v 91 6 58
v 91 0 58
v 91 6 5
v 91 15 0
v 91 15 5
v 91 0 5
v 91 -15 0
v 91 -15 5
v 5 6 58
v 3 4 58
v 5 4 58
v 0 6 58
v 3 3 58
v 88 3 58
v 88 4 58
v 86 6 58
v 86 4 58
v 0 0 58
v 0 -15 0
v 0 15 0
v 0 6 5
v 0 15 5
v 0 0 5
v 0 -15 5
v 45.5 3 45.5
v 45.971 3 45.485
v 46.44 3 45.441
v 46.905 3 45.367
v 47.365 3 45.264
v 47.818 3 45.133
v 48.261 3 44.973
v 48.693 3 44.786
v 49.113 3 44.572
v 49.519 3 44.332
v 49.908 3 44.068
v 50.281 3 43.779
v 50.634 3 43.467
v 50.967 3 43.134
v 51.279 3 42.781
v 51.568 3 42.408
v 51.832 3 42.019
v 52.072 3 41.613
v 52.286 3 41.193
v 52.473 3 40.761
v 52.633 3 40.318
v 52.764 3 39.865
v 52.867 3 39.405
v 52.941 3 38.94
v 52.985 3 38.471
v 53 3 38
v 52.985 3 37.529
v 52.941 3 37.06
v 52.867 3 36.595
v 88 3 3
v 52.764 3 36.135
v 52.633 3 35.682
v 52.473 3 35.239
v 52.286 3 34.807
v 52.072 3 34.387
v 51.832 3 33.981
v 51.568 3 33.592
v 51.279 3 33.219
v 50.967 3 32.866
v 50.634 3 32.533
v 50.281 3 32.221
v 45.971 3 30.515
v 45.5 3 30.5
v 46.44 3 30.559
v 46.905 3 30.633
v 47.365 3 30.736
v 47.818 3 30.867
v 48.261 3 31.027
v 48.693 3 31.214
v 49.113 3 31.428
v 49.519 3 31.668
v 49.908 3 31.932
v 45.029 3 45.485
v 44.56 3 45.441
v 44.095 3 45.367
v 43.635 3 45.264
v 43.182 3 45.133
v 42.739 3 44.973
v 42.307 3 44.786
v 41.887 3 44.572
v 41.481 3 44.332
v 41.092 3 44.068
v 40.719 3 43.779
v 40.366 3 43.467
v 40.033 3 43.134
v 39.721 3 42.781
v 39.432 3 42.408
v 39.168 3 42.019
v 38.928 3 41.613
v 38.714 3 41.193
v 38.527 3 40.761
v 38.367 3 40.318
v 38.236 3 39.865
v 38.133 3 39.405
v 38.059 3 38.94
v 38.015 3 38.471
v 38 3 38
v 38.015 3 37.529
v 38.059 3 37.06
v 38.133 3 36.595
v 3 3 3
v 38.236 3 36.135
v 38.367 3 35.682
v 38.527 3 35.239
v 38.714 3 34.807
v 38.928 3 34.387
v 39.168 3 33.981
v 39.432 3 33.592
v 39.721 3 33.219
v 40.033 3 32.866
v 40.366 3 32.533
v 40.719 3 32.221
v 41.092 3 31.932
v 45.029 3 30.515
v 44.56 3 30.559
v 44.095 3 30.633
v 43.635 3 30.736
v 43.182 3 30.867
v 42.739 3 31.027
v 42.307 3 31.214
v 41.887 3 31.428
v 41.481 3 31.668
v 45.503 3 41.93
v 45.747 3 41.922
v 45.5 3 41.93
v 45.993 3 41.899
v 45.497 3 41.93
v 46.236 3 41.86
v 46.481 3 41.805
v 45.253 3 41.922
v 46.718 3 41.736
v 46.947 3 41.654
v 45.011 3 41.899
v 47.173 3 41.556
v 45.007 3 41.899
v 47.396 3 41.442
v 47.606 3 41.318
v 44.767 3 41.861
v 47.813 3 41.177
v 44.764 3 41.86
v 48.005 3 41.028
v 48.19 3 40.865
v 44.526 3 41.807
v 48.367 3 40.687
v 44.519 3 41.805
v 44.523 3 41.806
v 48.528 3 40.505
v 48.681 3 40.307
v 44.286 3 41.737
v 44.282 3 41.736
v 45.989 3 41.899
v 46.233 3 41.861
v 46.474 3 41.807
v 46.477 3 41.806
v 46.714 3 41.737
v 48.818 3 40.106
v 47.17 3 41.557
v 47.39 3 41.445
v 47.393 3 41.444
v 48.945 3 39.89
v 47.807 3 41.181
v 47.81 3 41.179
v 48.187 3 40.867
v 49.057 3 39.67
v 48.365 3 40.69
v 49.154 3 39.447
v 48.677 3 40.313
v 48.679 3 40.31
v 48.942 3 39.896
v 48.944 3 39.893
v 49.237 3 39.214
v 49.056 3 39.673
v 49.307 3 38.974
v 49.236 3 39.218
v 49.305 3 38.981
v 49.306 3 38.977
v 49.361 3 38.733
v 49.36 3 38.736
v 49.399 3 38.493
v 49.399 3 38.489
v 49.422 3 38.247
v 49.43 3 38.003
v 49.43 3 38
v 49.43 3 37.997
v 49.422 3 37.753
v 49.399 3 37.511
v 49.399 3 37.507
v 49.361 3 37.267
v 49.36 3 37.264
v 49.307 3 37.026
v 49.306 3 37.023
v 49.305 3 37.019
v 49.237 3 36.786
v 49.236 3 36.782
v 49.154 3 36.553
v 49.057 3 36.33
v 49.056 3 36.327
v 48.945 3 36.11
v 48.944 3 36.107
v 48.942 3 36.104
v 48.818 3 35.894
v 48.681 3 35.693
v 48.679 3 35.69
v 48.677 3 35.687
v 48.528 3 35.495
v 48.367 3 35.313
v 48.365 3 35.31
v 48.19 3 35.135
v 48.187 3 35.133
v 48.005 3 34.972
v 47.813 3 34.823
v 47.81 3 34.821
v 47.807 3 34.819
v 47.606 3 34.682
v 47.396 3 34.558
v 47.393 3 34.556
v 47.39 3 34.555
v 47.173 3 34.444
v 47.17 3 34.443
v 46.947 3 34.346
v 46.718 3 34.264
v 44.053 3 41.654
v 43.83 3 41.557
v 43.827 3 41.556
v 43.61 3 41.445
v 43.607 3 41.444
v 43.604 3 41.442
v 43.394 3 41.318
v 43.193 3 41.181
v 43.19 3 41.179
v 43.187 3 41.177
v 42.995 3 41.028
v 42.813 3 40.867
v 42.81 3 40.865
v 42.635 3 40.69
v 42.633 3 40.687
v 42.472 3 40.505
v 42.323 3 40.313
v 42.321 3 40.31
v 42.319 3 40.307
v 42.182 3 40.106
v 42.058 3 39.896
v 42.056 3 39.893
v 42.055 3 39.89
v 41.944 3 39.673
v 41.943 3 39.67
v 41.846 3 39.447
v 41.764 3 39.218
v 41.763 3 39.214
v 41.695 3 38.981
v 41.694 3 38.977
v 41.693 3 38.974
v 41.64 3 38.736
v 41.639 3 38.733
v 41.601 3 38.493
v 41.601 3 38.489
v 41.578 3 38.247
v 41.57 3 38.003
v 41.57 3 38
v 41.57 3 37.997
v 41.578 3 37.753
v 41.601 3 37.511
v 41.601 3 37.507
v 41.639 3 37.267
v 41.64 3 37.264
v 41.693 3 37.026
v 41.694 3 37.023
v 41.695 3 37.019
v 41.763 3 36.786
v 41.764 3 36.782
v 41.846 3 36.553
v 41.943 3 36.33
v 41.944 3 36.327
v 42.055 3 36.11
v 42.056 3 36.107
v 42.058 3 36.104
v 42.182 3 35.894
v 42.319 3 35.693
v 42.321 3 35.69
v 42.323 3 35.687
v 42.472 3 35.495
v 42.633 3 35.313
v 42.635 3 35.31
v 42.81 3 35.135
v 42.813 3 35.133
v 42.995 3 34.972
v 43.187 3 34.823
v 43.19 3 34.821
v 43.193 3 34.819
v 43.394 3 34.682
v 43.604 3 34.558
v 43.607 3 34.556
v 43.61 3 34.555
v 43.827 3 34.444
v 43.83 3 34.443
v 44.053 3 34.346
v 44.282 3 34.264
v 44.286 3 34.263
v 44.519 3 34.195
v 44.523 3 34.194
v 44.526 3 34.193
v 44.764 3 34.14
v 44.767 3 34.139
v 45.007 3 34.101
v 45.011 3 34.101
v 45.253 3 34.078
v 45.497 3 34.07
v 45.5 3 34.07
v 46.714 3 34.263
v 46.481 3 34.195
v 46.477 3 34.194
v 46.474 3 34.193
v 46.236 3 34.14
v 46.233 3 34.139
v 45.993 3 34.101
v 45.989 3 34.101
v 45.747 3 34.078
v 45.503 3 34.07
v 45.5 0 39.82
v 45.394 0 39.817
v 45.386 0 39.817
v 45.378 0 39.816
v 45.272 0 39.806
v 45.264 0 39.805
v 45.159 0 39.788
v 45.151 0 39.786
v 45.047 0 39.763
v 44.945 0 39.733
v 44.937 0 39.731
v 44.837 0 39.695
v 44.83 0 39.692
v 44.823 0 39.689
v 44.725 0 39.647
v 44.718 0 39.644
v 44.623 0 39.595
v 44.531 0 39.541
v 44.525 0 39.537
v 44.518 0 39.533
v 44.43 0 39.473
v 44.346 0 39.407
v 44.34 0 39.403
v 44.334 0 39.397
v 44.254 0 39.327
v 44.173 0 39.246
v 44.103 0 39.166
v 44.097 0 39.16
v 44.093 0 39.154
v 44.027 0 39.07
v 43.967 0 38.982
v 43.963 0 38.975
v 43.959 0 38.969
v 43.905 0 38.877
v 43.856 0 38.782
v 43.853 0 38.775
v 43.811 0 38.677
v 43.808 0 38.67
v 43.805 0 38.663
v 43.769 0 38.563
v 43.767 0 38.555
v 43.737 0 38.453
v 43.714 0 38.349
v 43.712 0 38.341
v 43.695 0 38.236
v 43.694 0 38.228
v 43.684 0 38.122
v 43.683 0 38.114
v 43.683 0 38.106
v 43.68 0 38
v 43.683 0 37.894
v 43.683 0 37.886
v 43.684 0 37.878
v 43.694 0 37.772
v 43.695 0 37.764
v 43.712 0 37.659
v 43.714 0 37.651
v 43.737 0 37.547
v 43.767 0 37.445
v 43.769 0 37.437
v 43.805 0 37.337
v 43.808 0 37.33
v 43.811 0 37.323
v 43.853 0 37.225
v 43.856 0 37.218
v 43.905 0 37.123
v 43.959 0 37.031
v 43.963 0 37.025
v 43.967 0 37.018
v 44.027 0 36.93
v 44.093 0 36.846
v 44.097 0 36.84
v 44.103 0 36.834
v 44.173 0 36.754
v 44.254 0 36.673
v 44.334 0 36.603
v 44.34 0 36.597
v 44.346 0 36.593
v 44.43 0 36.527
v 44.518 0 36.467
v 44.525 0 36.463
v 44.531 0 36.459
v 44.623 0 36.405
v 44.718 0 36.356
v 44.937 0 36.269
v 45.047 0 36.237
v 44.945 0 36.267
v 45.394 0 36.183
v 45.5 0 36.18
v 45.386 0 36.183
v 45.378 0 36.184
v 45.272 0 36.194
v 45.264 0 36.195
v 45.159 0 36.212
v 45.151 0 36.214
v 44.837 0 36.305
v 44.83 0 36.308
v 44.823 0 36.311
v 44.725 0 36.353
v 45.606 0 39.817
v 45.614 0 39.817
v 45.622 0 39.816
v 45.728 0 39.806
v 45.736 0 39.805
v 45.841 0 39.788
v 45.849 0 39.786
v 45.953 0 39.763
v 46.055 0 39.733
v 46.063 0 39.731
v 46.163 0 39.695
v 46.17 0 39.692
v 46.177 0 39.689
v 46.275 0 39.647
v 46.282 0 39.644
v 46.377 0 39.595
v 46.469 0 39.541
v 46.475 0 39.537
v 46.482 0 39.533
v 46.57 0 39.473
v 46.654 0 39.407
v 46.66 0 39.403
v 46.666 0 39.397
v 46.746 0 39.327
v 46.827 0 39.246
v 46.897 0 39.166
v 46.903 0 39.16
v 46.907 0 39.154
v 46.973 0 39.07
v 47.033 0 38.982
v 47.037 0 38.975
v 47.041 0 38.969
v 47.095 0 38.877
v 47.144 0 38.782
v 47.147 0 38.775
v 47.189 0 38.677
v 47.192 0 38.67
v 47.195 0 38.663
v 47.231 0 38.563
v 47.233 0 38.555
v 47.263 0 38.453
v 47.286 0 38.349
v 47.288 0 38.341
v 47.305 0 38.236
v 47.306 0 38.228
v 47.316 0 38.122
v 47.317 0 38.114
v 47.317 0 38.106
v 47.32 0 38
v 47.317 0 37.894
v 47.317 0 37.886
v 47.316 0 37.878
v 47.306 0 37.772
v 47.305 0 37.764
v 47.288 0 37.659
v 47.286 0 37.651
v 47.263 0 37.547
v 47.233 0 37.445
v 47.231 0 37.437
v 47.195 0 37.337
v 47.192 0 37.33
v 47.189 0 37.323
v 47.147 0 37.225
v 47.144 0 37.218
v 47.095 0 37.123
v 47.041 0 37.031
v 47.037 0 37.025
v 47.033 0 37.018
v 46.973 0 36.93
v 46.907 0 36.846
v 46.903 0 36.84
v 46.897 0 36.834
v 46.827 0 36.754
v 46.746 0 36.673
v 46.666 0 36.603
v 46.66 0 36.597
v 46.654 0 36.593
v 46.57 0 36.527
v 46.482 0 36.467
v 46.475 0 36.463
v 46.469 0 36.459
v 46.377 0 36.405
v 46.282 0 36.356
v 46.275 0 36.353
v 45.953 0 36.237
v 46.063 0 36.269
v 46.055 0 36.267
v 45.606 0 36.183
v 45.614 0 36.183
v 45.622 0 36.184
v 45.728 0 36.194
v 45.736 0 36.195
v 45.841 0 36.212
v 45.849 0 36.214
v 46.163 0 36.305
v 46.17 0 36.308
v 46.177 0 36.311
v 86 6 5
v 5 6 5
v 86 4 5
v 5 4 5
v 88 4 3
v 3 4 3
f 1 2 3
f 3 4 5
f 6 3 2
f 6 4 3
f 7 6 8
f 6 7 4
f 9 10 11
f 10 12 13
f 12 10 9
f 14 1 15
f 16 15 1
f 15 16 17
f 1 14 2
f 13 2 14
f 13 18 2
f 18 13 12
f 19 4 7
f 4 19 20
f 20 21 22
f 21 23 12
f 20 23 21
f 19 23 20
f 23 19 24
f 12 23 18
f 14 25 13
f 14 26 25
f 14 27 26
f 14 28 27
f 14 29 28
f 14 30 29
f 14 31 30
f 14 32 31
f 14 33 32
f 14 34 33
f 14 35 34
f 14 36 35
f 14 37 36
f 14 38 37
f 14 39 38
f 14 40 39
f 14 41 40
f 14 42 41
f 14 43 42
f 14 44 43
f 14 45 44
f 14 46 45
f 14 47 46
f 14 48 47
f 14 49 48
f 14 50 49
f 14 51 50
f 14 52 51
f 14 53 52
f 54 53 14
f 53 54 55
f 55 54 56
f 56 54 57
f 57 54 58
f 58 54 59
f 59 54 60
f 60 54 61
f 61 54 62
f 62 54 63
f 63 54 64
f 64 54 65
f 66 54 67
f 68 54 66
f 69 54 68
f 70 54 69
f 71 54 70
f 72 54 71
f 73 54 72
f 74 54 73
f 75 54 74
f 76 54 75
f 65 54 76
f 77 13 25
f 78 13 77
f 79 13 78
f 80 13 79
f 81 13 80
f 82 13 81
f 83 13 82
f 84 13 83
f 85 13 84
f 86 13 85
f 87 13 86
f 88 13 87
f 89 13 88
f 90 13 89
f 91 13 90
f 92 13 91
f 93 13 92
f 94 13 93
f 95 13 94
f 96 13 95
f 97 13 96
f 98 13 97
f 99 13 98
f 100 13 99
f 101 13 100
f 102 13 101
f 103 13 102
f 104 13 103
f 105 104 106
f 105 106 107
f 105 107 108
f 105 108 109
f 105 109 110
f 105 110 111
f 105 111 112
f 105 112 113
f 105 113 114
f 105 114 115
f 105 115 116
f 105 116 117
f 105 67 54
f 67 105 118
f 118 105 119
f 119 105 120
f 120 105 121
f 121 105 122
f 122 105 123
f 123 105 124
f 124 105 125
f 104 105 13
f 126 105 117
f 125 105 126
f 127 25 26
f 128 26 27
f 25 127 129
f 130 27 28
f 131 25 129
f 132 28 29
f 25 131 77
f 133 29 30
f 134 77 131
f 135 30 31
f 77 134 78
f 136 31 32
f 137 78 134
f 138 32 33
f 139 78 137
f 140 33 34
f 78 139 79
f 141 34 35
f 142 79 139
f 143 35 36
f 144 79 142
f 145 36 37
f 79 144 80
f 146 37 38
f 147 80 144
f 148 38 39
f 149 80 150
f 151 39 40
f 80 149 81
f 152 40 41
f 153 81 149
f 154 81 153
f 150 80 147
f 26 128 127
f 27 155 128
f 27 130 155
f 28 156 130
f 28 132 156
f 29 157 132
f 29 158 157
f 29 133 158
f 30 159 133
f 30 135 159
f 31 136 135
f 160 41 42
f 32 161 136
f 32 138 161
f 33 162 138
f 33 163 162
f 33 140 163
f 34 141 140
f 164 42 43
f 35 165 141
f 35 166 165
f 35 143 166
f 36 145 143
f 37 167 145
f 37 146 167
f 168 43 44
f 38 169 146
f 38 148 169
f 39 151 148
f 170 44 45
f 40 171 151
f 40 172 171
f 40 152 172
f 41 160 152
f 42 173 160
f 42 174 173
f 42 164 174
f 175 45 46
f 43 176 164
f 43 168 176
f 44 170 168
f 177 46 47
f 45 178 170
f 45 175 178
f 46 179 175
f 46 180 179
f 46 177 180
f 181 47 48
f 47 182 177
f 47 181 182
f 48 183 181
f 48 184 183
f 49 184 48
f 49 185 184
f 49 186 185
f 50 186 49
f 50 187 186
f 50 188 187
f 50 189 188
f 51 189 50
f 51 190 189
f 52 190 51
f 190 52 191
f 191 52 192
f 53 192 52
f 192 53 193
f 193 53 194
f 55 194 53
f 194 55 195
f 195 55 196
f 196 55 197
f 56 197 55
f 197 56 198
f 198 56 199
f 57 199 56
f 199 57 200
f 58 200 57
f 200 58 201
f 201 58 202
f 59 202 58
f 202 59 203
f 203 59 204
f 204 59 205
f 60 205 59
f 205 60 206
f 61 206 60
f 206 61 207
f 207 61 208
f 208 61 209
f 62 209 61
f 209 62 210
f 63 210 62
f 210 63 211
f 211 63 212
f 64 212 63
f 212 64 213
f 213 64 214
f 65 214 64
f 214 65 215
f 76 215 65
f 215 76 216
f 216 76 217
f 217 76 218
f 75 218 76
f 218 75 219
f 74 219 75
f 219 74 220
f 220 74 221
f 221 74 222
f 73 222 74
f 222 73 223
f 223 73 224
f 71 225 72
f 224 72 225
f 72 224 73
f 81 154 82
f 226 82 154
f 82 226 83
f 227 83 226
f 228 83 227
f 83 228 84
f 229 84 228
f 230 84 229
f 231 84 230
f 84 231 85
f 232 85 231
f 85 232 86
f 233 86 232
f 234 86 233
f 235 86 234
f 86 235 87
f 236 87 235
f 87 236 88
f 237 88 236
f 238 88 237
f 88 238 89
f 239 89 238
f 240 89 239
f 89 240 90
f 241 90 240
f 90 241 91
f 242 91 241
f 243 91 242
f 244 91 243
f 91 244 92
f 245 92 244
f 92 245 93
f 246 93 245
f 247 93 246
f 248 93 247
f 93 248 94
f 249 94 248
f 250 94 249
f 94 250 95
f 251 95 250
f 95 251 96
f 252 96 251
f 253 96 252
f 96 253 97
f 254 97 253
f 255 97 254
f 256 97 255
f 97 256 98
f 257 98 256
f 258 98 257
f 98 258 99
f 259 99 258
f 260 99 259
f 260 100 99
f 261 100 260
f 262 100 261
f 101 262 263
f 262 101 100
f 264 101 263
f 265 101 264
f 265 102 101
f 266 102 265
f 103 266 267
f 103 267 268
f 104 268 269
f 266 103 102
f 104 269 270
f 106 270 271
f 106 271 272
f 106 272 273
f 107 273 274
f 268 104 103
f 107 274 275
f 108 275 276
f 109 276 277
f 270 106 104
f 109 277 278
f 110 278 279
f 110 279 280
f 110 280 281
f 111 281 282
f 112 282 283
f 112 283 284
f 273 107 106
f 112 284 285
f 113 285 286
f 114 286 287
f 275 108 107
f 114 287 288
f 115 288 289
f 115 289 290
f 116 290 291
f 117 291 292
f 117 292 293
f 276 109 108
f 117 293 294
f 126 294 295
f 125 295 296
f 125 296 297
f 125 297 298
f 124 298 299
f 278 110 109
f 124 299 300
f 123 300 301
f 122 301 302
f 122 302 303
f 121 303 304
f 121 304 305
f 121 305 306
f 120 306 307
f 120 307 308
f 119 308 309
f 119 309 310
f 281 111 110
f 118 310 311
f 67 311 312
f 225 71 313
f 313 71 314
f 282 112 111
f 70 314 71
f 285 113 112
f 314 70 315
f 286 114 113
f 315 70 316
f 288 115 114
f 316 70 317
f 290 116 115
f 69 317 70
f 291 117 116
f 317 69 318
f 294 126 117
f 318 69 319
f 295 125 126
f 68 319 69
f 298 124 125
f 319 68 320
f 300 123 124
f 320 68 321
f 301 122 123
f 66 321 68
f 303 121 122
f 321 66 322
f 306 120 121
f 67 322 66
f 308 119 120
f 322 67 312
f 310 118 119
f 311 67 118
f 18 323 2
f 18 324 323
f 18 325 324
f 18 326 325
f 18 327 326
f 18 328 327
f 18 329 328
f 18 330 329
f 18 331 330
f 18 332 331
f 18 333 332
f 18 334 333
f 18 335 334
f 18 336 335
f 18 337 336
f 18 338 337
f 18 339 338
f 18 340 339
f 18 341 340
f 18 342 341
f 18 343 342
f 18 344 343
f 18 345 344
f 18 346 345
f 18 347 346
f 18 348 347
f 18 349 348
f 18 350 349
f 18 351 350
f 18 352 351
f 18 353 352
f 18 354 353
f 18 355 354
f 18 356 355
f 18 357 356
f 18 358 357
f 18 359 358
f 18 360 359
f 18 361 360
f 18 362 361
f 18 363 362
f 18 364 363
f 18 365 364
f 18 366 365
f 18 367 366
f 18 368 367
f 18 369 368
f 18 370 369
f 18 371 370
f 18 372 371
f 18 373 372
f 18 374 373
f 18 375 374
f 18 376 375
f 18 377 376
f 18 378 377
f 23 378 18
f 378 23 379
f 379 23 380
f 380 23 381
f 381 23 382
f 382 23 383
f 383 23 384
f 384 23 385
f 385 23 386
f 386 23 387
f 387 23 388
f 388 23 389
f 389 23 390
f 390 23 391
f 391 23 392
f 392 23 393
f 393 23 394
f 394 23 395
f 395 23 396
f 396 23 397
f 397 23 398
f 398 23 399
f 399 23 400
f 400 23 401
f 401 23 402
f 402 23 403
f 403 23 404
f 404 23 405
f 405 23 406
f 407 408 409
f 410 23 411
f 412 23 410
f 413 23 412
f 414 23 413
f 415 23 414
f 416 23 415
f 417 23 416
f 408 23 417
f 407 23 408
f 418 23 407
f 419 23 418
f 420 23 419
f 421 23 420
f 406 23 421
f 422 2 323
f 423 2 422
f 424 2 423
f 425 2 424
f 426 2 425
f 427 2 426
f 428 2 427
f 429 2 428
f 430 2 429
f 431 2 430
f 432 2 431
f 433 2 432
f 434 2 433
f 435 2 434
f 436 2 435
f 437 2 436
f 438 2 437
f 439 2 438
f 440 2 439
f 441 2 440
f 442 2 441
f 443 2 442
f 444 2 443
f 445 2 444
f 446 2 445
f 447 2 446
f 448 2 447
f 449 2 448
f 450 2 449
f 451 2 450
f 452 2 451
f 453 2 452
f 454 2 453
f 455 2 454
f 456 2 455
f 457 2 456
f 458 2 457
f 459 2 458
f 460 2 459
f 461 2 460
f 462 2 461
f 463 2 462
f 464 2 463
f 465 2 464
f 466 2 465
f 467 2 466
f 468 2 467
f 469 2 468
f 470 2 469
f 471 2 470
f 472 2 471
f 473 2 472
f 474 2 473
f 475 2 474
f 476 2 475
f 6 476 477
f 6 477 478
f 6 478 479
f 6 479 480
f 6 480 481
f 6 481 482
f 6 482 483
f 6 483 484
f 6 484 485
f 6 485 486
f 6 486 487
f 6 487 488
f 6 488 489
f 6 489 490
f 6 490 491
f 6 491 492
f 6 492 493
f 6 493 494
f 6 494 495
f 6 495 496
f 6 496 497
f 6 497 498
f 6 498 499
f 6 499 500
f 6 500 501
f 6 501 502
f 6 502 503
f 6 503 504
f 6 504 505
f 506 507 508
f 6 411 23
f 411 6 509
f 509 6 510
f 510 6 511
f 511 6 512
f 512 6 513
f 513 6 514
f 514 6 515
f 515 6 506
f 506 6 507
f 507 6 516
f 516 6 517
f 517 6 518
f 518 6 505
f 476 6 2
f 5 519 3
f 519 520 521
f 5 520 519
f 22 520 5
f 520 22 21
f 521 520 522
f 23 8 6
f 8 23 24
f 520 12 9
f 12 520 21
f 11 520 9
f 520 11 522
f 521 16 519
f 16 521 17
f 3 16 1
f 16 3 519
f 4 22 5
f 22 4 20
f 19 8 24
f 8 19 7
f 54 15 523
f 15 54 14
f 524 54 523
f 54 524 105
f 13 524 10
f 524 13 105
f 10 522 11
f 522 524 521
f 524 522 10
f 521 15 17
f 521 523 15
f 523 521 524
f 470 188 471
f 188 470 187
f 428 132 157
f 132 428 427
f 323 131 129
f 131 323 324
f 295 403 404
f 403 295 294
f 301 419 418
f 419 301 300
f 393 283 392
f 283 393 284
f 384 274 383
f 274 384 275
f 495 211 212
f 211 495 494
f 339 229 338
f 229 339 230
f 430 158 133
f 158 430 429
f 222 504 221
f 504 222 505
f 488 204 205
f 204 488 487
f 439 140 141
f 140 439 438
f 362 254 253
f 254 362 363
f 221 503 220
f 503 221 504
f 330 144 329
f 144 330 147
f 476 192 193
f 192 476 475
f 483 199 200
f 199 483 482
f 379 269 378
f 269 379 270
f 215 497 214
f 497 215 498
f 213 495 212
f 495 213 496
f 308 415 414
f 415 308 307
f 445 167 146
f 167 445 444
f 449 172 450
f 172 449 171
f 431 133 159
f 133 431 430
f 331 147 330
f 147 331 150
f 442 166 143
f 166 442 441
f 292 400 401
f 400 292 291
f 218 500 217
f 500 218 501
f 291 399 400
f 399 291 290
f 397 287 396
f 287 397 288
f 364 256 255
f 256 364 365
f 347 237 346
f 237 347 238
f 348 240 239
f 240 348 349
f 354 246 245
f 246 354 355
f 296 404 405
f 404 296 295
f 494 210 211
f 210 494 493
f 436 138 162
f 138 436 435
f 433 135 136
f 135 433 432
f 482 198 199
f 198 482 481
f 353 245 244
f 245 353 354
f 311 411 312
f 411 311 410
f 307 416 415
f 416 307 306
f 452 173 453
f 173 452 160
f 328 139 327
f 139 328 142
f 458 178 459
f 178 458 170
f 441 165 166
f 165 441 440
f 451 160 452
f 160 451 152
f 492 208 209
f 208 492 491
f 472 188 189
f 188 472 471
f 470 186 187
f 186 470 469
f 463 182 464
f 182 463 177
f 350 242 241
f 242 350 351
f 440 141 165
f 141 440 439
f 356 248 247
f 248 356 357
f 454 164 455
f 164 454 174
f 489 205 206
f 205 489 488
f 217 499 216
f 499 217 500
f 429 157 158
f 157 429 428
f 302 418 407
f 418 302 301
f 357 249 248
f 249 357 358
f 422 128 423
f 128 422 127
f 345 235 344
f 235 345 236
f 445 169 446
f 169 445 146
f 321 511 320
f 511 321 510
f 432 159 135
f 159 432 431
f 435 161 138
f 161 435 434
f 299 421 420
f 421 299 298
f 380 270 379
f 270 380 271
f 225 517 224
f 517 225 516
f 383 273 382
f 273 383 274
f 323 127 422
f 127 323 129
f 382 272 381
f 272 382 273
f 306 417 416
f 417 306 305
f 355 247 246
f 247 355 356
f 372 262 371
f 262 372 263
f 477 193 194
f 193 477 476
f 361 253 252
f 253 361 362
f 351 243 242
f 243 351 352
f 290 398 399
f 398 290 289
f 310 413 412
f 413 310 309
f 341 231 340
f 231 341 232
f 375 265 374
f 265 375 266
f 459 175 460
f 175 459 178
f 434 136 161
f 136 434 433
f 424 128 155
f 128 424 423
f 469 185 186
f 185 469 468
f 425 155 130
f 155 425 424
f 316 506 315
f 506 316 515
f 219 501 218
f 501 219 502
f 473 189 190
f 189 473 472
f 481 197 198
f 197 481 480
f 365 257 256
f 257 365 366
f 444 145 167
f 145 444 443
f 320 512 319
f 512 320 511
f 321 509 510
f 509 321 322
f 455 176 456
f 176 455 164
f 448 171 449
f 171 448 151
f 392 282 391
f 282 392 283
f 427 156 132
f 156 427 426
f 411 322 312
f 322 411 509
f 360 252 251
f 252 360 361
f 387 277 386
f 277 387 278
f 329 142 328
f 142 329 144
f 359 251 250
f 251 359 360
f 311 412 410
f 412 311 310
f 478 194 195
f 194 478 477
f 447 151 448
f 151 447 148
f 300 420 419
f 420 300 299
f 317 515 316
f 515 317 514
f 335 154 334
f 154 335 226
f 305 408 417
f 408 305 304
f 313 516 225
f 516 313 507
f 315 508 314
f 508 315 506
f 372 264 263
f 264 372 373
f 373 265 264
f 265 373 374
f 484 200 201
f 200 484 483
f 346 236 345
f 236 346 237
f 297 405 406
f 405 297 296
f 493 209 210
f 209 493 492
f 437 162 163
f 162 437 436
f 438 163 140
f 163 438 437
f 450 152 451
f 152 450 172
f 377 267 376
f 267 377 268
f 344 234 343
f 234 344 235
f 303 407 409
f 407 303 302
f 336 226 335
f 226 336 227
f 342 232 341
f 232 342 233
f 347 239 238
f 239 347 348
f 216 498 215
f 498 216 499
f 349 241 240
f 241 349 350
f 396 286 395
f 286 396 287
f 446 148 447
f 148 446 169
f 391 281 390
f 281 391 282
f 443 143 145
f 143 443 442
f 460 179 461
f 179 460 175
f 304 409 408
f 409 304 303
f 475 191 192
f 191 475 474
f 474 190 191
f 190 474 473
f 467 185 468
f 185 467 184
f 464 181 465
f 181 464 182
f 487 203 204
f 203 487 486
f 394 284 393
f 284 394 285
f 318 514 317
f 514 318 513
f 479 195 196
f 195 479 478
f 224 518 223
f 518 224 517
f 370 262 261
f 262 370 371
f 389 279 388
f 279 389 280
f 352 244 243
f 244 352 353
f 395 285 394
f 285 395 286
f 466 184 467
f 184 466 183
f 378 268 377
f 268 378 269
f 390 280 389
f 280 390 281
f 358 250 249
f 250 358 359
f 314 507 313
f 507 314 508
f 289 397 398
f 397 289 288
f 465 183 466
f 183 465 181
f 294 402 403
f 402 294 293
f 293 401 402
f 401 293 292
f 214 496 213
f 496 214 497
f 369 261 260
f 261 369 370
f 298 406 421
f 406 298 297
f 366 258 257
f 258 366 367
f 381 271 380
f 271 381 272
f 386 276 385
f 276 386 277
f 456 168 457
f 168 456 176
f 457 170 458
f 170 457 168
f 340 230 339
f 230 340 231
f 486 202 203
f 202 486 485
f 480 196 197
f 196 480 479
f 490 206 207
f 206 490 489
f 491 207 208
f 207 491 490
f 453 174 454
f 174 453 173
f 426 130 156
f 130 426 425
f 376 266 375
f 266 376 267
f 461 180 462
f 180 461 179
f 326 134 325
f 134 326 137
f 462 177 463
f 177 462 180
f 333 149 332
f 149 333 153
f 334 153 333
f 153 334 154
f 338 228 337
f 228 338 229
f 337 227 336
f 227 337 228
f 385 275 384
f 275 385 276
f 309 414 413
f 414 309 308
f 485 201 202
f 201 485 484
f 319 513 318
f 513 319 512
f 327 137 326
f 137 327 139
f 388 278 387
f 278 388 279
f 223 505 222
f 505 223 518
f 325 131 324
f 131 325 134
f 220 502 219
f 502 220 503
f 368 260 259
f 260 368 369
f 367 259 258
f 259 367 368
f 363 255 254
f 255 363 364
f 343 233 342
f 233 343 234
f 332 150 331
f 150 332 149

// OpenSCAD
// Internal width
Width = 85; // [30:150]
// Internal height
Height = 55; // [30:150]

// Stand width. 0 for no stand
Stand = 30;
// With hole for screw
WithHole = true;

// With top border
WithTopBorder = false;

module frame() {
    WidthAndBorder = Width + 6;
    HeightAndBorder = Height + 3;
    difference() {
        union() {            
            cube([WidthAndBorder,3,HeightAndBorder]);
            cube([WidthAndBorder,6,5]);       
            if (WithTopBorder) {
                translate([0,0,HeightAndBorder - 5]) cube([WidthAndBorder,6,5]);
            }
            cube([5,6,HeightAndBorder]);  
            translate([WidthAndBorder - 5,0,0]) cube([5,6,HeightAndBorder]);     
            if (Stand > 0) {
                translate([0,-Stand/2,0]) cube([WidthAndBorder,Stand,5]);
            }  
        }
        translate([3,3,3]) cube([Width,1,HeightAndBorder]);
        if (WithHole) {
            translate([WidthAndBorder/2,-0.1,HeightAndBorder-20]) rotate([-90,0,0]) 
                cylinder(d = 15 - 0.1, h = 3 + 0.2, $fn = 100); 
        }
    }
    if (WithHole) {
        translate([WidthAndBorder/2,0,HeightAndBorder-20]) rotate([-90,0,0]) 
            difference(){  
                cylinder(d = 15, h = 3, $fn = 100);
                translate([0,0,-0.1]) cylinder(d1 = 3.5, d2 = 8, h = 3.2, $fn = 100);
            }
    }    
}

frame();
